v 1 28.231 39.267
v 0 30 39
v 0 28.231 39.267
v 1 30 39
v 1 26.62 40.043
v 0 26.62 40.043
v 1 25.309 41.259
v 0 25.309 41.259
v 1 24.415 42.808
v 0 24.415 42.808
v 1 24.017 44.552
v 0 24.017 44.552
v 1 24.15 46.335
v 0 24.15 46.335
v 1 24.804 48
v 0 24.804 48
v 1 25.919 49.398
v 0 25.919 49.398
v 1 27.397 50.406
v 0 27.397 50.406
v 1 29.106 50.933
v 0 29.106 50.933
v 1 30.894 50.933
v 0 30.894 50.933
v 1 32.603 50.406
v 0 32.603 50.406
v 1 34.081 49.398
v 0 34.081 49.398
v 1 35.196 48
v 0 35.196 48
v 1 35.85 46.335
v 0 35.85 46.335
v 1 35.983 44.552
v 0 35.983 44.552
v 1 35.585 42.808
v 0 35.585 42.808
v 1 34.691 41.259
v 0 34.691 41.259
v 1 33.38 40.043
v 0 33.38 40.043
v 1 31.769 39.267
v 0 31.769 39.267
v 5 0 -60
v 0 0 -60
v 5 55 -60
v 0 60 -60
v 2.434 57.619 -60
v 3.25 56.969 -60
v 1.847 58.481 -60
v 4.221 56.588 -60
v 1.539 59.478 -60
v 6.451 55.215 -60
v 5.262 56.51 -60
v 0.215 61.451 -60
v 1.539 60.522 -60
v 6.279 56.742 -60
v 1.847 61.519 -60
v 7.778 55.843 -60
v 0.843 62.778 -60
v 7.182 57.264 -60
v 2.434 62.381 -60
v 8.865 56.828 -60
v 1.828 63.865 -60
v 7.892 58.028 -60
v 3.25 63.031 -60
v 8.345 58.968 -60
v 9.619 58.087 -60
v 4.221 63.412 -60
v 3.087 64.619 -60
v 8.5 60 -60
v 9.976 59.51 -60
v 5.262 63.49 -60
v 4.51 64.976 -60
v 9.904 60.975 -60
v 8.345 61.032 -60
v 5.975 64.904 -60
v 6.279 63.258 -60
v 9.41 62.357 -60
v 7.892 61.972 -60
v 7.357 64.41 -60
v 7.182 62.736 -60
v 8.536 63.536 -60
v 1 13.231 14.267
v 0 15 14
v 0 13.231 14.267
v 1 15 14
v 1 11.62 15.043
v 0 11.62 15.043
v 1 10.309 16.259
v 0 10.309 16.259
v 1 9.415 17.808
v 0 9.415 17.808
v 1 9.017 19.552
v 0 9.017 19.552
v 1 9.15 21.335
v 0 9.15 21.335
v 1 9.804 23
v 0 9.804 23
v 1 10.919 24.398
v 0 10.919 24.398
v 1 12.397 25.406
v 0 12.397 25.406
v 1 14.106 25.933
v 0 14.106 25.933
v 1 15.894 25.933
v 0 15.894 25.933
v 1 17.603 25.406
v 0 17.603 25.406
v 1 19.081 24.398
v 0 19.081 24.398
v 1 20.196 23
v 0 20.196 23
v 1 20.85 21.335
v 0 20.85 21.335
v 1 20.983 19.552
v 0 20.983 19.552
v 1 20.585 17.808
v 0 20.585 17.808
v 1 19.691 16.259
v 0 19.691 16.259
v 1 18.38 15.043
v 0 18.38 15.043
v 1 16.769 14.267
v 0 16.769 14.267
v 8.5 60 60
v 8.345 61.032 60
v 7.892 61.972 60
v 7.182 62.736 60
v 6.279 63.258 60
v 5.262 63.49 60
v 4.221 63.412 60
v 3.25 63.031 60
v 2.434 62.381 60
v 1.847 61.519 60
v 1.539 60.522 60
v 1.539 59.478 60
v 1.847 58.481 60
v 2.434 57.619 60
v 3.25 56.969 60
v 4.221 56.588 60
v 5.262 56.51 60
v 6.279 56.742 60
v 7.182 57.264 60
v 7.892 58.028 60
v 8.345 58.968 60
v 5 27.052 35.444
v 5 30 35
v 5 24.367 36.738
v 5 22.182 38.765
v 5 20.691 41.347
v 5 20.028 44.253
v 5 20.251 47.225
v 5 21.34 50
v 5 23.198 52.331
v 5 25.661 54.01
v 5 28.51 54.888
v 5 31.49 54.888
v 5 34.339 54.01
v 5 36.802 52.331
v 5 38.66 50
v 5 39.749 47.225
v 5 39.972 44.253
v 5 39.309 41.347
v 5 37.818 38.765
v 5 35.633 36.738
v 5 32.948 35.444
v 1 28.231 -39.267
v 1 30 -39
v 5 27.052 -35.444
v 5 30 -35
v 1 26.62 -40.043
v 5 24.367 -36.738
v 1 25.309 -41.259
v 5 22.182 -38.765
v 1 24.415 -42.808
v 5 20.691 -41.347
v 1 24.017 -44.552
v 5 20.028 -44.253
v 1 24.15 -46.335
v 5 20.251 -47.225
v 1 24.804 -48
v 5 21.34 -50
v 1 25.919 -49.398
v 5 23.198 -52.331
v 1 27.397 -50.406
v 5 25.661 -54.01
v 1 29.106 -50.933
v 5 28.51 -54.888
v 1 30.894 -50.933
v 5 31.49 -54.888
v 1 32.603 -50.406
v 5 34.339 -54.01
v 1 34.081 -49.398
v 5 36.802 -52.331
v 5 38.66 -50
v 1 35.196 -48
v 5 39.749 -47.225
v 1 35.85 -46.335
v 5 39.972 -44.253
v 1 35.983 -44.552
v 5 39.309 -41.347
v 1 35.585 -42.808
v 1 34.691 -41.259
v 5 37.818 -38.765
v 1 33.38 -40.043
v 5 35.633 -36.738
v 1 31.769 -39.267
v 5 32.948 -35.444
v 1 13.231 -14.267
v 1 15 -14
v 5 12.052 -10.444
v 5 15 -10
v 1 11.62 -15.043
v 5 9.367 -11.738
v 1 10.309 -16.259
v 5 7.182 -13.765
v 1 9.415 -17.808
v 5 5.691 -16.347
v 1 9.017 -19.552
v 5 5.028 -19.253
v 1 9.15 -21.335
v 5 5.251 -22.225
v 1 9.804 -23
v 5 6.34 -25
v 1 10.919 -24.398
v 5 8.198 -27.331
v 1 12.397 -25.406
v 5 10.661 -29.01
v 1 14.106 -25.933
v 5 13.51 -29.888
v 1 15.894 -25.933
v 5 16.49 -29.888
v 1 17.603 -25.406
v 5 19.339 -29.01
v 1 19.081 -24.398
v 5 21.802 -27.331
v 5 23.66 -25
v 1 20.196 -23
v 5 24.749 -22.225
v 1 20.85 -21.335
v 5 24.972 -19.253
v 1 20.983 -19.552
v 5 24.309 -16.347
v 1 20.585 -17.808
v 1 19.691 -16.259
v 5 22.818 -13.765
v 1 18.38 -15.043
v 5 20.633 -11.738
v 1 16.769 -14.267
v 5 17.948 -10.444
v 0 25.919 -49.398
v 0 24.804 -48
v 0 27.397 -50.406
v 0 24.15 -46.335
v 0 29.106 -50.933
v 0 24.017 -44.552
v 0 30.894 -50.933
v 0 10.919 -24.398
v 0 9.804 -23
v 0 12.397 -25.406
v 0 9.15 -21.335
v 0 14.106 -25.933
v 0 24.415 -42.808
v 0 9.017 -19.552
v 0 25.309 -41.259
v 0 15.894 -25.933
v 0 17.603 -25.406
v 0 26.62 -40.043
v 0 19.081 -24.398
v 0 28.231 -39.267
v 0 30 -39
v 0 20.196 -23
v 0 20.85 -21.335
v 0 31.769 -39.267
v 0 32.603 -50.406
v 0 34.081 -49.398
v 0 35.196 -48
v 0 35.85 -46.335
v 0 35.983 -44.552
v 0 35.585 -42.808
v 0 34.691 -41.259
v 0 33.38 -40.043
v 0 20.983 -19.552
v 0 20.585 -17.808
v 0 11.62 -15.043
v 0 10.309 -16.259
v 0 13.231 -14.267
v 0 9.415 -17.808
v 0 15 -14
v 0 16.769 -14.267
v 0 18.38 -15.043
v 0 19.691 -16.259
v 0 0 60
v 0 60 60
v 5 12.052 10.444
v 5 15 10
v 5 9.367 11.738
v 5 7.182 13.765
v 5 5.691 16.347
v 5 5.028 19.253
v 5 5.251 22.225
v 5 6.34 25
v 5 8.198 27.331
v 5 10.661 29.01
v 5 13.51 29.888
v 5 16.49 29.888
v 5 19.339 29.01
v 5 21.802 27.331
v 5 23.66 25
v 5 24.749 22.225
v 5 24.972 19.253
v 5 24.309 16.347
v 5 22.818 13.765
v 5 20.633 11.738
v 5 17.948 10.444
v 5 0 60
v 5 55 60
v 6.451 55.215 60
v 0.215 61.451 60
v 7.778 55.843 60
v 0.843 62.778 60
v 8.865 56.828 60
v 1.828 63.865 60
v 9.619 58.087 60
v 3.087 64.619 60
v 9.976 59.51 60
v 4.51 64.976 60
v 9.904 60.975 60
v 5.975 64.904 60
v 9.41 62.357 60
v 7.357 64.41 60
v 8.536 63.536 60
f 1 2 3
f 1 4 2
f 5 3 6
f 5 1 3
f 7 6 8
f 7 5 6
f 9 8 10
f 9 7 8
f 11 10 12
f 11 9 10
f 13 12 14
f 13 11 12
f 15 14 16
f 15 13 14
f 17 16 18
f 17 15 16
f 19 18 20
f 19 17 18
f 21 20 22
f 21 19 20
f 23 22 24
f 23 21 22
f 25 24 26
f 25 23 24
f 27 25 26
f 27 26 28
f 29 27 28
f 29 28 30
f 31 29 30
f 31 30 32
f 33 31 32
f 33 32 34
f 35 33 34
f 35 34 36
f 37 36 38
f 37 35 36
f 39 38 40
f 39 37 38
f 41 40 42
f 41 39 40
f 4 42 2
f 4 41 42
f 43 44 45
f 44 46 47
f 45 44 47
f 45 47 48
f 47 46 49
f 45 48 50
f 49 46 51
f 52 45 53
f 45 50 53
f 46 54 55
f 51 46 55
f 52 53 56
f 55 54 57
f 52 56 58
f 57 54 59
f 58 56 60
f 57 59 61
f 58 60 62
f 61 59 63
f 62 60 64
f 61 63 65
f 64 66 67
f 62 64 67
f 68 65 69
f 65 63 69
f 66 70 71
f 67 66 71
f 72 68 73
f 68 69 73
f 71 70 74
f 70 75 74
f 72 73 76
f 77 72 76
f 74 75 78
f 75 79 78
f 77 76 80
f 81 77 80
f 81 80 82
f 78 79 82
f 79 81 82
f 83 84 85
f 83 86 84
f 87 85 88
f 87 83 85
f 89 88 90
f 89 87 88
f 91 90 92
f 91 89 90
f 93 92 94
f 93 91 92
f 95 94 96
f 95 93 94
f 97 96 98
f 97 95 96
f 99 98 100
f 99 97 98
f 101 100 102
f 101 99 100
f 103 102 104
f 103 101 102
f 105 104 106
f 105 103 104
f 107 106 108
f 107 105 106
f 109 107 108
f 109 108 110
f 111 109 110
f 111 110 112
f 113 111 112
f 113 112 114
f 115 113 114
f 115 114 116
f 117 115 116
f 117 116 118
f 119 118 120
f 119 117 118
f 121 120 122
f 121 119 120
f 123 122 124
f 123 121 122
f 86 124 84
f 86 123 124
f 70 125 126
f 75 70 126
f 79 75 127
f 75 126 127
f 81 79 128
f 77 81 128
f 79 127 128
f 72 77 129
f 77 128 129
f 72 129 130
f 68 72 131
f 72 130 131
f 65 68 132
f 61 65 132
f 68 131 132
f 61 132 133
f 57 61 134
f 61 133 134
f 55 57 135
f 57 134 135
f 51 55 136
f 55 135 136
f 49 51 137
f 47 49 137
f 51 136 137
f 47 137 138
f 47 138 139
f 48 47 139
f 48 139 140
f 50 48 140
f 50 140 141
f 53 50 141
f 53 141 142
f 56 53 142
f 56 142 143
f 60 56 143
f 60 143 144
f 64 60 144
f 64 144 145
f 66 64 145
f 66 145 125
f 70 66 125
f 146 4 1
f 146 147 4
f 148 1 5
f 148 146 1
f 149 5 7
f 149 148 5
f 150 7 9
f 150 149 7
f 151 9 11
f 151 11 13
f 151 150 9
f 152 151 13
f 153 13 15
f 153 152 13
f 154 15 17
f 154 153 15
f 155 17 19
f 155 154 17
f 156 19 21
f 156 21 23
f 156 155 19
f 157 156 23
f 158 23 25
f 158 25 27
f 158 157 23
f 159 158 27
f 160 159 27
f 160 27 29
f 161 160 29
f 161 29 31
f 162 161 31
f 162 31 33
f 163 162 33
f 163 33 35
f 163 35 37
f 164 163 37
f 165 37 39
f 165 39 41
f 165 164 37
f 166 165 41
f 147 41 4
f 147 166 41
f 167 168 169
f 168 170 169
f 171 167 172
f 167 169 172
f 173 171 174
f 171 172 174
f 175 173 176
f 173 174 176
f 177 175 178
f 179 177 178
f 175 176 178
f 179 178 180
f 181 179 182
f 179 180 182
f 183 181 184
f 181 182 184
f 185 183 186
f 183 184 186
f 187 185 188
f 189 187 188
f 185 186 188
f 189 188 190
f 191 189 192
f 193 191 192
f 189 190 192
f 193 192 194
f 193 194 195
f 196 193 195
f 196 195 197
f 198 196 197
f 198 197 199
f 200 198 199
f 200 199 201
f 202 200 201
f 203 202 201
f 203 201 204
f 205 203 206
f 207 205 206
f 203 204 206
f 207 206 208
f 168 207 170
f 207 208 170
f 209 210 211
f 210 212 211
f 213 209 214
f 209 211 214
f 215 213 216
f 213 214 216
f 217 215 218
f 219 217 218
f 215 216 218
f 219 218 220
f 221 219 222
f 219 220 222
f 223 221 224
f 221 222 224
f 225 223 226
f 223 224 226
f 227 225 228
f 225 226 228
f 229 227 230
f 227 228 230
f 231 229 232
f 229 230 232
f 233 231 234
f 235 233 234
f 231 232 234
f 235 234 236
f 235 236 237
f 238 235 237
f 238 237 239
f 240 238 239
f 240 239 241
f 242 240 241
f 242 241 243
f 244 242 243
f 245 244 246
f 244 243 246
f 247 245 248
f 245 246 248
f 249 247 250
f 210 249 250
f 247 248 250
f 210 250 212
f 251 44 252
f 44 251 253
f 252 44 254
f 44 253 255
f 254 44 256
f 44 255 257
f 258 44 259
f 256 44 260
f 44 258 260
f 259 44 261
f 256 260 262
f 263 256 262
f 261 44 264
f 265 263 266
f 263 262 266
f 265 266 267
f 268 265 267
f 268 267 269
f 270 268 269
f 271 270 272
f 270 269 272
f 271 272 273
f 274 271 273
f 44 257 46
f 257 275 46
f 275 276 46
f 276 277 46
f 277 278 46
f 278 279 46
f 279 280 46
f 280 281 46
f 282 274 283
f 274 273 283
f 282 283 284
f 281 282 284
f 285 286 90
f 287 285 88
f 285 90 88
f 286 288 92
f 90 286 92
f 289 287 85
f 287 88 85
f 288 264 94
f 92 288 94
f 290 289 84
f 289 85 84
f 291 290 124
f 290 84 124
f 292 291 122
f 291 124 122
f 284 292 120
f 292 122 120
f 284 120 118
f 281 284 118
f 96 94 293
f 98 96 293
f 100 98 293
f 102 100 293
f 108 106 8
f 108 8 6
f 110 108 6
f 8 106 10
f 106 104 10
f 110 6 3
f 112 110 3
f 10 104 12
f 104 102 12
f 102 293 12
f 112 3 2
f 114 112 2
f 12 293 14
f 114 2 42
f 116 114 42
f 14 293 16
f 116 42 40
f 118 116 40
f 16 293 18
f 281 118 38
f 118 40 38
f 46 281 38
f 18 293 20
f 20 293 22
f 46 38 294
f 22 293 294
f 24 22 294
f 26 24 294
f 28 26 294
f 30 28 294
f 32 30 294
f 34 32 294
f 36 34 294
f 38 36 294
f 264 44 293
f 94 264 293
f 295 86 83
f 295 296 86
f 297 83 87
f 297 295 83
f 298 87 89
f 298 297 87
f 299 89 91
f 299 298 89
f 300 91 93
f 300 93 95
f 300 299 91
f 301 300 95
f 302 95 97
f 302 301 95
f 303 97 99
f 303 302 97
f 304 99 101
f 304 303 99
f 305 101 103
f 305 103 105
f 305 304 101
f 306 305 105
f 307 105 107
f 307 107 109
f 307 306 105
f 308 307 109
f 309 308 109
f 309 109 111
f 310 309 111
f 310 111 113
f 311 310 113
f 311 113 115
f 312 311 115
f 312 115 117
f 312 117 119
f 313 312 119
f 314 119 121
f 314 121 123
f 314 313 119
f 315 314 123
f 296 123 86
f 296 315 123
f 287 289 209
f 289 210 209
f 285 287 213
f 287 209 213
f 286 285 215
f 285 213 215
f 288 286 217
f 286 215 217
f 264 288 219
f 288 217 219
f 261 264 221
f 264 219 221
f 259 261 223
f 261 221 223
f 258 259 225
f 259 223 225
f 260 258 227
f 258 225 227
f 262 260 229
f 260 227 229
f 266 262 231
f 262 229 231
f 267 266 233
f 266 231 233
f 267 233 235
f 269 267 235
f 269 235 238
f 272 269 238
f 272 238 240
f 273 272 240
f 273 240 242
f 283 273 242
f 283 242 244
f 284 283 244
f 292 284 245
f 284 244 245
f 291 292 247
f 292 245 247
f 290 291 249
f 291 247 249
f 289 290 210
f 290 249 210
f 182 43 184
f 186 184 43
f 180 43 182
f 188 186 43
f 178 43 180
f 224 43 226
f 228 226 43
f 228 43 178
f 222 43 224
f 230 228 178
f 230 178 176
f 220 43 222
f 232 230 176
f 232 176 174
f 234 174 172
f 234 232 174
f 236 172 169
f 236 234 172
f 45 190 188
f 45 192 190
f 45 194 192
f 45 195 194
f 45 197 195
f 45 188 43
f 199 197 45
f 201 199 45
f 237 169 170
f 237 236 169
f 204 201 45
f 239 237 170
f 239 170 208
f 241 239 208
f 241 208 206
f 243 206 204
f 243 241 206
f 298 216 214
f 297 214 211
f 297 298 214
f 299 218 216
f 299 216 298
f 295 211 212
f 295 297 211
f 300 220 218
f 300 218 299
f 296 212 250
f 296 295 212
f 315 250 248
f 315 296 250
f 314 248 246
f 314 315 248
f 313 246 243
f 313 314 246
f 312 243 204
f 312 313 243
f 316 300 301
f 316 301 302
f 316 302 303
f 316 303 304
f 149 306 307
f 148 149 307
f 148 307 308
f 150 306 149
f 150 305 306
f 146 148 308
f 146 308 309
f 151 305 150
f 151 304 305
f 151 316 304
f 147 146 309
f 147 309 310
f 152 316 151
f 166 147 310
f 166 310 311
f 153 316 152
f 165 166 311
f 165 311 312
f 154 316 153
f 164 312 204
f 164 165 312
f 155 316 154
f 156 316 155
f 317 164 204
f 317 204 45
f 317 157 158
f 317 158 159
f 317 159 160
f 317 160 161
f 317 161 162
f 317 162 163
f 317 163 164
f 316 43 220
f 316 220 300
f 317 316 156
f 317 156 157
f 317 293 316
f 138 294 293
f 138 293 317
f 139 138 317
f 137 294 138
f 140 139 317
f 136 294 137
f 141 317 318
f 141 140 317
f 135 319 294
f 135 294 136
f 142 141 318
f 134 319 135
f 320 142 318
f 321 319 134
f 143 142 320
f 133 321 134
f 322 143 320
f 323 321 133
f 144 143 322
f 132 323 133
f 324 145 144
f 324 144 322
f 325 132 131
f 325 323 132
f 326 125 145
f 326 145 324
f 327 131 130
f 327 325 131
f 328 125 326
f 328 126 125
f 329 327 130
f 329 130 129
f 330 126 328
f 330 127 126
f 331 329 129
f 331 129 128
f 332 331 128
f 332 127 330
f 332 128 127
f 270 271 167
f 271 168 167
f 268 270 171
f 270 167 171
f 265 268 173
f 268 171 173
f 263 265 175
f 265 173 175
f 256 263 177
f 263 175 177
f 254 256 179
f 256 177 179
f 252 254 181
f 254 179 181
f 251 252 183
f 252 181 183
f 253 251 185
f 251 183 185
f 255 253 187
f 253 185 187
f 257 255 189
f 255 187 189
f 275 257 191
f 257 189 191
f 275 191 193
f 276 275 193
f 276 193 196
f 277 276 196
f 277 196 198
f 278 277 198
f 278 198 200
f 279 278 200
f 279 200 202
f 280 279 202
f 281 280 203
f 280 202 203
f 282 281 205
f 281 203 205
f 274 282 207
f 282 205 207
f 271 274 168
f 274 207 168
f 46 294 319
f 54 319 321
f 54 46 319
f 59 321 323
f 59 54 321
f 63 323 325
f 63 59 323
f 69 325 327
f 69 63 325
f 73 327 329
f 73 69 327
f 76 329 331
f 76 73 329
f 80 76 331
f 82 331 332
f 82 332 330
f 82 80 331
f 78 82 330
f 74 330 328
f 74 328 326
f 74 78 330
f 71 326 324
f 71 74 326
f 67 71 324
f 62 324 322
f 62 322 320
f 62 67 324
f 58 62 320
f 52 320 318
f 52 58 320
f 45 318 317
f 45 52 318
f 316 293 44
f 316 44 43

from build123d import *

# Parameters (mm, degrees)
SKETCH_1_W                  = 5
SKETCH_1_H                  = 60
EXTRUDE_2_DEPTH             = 60
SKETCH_2_R                  = 5
SKETCH_3_R                  = 3.5
CUT_EXTRUDE_1_DEPTH         = 137.839321834
HOLE_WIZARD_M101_AT_2_COUNT = 2
HOLE_WIZARD_M101_AT_2_PITCH = 29.154759474


with BuildPart() as part:
    # Эскиз1 → Вытянуть-Тонкостенный2 (new, symmetric)
    with BuildSketch(Plane.XY):
        with Locations((2.5, 30)):
            Rectangle(SKETCH_1_W, SKETCH_1_H)
    extrude(amount=EXTRUDE_2_DEPTH, both=True)

    # По траектории1: sweep along a curve in space
    with BuildLine() as sweep_1_path:
        Line((0, 60, 60), (0, 60, -60))
    # Эскиз2 → По траектории1 (sweep)
    with BuildSketch(Plane.XY.offset(60)):
        with Locations((5, 60)):
            Circle(SKETCH_2_R)
    sweep(path=sweep_1_path.line)

    # Эскиз3 → Вырез-Вытянуть1 (cut, through all)
    with BuildSketch(Plane.XY.offset(60)):
        with Locations((5, 60)):
            Circle(SKETCH_3_R)
    extrude(amount=-CUT_EXTRUDE_1_DEPTH, mode=Mode.SUBTRACT)

    # Эскиз8 → Зенковка для  винта с плоской головкой M101 (revolve, cut)
    with BuildSketch(Plane(origin=(5, 30, 45), x_dir=(0, 0, -1), z_dir=(0, 1, 0))):
        Polygon((0, 0), (0, 5), (6, 5), (6, 4), (10, 0), align=None)
    hole_wizard_m101 = revolve(axis=Axis((11.35, 30, 45), (-1, 0, 0)), mode=Mode.SUBTRACT)

    # Зенковка для  винта с плоской головкой M101 at 2: Зенковка для  винта с плоской головкой M101 ×2
    with Locations(*[Vector(0, -0.5144957554275265, -0.8574929257125442) * (i * HOLE_WIZARD_M101_AT_2_PITCH) for i in range(1, HOLE_WIZARD_M101_AT_2_COUNT)]):
        add(hole_wizard_m101, mode=Mode.SUBTRACT)

    # Зеркальное отражение1: Зенковка для  винта с плоской головкой M101 across plane
    add(hole_wizard_m101.mirror(Plane.XY), mode=Mode.SUBTRACT)

    # Зеркальное отражение1 copy 1 sketch → Зеркальное отражение1 copy 1 (revolve, cut)
    with BuildSketch(Plane(origin=(5, 15, -20), x_dir=(0, 0, 1), z_dir=(0, 1, 0))):
        Polygon((0, 0), (0, -5), (6, -5), (6, -4), (10, 0), align=None)
    revolve(axis=Axis((11.35, 15, -20), (1, 0, 0)), mode=Mode.SUBTRACT)


solid = part.part
